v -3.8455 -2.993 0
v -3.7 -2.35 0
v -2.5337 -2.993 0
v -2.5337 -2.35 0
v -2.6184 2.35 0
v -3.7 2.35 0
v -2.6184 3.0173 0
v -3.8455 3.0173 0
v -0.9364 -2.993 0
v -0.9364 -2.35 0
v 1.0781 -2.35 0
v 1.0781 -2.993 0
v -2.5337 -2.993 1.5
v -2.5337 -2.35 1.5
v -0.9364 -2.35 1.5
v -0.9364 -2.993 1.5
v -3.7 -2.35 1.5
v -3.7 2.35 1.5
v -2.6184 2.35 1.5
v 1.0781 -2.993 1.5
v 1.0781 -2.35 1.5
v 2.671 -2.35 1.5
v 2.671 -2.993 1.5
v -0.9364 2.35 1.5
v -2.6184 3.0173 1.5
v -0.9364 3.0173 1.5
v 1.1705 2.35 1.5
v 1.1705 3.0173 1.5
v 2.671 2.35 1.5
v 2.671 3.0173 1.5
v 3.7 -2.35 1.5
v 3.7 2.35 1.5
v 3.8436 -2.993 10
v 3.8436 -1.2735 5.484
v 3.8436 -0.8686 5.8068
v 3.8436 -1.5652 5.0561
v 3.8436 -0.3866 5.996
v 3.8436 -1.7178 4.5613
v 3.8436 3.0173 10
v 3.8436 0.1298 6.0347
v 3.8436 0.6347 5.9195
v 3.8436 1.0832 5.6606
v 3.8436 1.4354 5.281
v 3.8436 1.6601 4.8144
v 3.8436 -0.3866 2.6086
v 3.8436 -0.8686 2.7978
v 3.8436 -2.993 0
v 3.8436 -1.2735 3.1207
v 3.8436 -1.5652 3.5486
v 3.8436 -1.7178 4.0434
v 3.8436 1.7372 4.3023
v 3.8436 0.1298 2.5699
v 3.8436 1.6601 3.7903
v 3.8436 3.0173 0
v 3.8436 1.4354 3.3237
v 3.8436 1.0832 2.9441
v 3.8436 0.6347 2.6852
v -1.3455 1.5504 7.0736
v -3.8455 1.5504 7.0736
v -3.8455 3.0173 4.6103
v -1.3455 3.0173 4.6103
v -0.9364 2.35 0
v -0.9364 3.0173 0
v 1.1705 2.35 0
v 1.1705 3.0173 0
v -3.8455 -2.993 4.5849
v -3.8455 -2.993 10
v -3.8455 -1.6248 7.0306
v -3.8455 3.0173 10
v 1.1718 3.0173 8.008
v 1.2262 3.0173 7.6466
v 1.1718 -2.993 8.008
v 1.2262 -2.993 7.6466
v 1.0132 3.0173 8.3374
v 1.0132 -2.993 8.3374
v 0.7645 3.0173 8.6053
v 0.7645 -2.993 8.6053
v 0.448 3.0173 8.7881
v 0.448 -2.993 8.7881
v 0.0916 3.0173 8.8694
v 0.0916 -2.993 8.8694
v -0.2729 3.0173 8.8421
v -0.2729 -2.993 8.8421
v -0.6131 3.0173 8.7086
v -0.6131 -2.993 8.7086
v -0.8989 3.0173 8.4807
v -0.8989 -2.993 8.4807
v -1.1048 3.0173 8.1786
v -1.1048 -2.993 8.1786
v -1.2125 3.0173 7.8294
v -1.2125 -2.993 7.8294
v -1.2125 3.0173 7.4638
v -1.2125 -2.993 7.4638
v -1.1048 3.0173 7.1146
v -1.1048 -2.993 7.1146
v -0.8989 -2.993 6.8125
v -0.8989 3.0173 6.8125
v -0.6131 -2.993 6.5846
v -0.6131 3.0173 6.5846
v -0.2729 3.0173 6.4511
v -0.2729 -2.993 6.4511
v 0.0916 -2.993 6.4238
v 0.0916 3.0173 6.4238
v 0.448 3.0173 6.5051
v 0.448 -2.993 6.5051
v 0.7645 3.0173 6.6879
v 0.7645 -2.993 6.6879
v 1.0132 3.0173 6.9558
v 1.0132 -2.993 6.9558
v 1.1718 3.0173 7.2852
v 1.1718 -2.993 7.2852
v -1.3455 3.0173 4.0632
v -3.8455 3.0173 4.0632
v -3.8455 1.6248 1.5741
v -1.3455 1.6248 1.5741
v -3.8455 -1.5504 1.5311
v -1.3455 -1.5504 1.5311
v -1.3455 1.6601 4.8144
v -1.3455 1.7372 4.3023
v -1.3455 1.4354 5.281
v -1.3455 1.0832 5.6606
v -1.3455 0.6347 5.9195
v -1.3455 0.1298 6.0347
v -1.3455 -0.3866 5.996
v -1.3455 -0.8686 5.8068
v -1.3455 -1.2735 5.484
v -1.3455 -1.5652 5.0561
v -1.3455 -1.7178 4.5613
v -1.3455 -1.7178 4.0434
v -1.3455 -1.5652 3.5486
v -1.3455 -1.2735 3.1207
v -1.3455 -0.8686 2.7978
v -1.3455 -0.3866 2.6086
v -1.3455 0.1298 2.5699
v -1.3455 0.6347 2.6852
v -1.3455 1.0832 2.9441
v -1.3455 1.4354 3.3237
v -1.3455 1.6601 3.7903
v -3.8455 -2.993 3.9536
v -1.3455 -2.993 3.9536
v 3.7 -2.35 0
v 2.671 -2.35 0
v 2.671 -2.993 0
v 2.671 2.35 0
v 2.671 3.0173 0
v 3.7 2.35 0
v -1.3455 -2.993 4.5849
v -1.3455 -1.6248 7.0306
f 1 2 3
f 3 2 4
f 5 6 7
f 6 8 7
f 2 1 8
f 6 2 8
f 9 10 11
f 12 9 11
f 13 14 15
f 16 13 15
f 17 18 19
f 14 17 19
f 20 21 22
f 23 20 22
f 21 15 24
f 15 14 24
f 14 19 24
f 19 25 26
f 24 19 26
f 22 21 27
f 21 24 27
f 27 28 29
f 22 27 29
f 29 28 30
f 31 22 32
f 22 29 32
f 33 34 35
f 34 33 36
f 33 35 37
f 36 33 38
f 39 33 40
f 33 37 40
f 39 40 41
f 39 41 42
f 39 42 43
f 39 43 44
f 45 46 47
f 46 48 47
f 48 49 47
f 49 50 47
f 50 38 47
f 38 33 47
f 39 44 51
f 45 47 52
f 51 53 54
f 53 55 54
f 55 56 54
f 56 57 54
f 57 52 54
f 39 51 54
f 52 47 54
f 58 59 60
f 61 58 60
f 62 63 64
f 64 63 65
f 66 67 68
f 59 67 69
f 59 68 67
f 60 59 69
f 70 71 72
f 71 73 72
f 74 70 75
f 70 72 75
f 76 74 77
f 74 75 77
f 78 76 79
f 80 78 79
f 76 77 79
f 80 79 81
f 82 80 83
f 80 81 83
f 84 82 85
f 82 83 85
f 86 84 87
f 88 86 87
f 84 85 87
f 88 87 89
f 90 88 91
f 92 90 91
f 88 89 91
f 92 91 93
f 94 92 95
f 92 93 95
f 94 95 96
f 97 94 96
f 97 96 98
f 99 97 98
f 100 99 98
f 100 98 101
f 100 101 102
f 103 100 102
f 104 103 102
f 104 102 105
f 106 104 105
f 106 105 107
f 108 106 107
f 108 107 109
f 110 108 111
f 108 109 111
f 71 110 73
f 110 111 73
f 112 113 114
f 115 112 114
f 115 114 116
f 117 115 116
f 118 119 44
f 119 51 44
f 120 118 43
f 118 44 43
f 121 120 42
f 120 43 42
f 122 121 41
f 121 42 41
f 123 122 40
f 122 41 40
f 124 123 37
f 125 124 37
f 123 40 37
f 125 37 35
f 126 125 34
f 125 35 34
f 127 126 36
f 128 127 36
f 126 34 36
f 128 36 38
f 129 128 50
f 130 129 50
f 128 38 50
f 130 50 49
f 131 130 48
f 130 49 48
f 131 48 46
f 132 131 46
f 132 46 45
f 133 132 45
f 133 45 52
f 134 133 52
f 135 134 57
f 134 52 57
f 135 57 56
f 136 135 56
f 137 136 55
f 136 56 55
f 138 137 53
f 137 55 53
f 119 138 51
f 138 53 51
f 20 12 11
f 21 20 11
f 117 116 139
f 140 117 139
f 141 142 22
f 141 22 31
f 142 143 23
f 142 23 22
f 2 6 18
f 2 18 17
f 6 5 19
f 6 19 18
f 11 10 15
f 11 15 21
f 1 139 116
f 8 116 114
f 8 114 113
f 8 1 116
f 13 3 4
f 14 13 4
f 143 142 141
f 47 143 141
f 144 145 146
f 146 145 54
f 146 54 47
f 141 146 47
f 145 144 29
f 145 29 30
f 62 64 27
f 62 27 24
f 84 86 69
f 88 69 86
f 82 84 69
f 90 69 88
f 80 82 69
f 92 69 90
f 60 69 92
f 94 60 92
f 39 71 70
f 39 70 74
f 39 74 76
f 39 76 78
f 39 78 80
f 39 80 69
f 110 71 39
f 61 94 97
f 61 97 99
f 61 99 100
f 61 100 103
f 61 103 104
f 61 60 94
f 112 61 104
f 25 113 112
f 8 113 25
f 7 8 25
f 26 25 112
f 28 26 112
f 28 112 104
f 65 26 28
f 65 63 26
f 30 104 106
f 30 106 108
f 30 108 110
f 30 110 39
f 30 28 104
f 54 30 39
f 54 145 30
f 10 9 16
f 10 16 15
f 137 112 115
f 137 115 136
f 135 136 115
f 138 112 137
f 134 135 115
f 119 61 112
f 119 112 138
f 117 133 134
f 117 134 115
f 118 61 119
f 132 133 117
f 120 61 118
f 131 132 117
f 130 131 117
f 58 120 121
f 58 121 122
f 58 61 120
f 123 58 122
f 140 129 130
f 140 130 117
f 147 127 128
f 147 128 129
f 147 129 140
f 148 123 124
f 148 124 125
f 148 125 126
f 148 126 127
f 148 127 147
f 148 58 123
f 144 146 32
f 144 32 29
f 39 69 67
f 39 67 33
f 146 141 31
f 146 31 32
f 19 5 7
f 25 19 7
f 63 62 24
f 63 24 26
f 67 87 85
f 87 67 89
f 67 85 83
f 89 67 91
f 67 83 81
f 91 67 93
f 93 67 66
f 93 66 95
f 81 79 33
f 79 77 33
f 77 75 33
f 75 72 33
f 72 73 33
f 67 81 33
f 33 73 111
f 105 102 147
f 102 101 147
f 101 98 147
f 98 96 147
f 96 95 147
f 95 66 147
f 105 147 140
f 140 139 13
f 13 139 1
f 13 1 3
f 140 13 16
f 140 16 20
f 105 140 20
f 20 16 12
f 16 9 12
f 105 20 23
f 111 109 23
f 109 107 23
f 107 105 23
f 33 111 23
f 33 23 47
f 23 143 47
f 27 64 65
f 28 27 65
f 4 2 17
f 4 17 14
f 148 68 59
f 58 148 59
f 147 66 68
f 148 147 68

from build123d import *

# Parameters (mm, degrees)
F0_W          = 7.6891479548
F0_H          = 6.0103421565
F1_DEPTH      = 10
F2_W          = 1.6820132732
F2_H          = 1.2127011675
F2_W_2        = 1.5973832924
F2_H_2        = 1.5515421644
F2_W_3        = 1.5004627639
F2_W_4        = 1.5929426299
F3_DEPTH      = 1.5
F4_R          = 1.7372427754
F5_DEPTH      = 25
F5_DEPTH_BACK = 25
F6_R          = 1.2262394043
F7_DEPTH      = 25
F7_DEPTH_BACK = 25
F8_R          = 1.7372427754
F9_DEPTH      = 2.5


with BuildPart() as f1:
    # F0 (on Top) → F1 (new body)
    with BuildSketch(Plane.XY):
        with Locations((-0.0009319047, 0.0121527119)):
            Rectangle(F0_W, F0_H)
    extrude(amount=F1_DEPTH)

    # F2 (on Top) → F3 (cut)
    with BuildSketch(Plane.XY):
        Polygon((-2.6183645241, 2.35), (-3.7, 2.35), (-3.7, -2.35), (-2.5337345432, -2.35), (-0.9363512509, -2.35), (1.0780681623, -2.35), (2.6710107923, -2.35), (3.7, -2.35), (3.7, 2.35), (2.6710107923, 2.35), (1.1705480283, 2.35), (-0.9363512509, 2.35), align=None)
        with Locations((-1.7773578875, 2.9563505838)):
            Rectangle(F2_W, F2_H)
        with Locations((-1.7350428971, -3.1257710822)):
            Rectangle(F2_W_2, F2_H_2)
        with Locations((1.9207794103, 2.9563505838)):
            Rectangle(F2_W_3, F2_H)
        with Locations((1.8745394773, -3.1257710822)):
            Rectangle(F2_W_4, F2_H_2)
    extrude(amount=F3_DEPTH, mode=Mode.SUBTRACT)

    # F4 (on Right) → F5 (cut, two sides)
    with BuildSketch(Plane.YZ) as f5_sk:
        with Locations((0, 4.3023279868)):
            Circle(F4_R)
    extrude(amount=-F5_DEPTH, mode=Mode.SUBTRACT)
    extrude(f5_sk.sketch, amount=F5_DEPTH_BACK, mode=Mode.SUBTRACT)

    # F6 (on Front) → F7 (cut, two sides)
    with BuildSketch(Plane.XZ) as f7_sk:
        with Locations((0, 7.6466021128)):
            Circle(F6_R)
    extrude(amount=F7_DEPTH, mode=Mode.SUBTRACT)
    extrude(f7_sk.sketch, amount=-F7_DEPTH_BACK, mode=Mode.SUBTRACT)

    # F8 (on face) → F9 (cut)
    with BuildSketch(Plane(origin=(-3.8455058821, 0, 0), x_dir=(0, -1, 0), z_dir=(-1, 0, 0))):
        Polygon((2.9930183664, 4.5848923734), (1.6247780807, 7.0305929156), (-1.5503576963, 7.0735595446), (-3.0173237901, 4.6102864409), (-3.0173237901, 4.0632090305), (-1.6247780807, 1.574063058), (1.5503576963, 1.531096429), (2.9930183664, 3.953556799), align=None)
        with Locations((0, 4.3023279868)):
            Circle(F8_R, mode=Mode.SUBTRACT)
    extrude(amount=-F9_DEPTH, mode=Mode.SUBTRACT)


solid = f1.part
